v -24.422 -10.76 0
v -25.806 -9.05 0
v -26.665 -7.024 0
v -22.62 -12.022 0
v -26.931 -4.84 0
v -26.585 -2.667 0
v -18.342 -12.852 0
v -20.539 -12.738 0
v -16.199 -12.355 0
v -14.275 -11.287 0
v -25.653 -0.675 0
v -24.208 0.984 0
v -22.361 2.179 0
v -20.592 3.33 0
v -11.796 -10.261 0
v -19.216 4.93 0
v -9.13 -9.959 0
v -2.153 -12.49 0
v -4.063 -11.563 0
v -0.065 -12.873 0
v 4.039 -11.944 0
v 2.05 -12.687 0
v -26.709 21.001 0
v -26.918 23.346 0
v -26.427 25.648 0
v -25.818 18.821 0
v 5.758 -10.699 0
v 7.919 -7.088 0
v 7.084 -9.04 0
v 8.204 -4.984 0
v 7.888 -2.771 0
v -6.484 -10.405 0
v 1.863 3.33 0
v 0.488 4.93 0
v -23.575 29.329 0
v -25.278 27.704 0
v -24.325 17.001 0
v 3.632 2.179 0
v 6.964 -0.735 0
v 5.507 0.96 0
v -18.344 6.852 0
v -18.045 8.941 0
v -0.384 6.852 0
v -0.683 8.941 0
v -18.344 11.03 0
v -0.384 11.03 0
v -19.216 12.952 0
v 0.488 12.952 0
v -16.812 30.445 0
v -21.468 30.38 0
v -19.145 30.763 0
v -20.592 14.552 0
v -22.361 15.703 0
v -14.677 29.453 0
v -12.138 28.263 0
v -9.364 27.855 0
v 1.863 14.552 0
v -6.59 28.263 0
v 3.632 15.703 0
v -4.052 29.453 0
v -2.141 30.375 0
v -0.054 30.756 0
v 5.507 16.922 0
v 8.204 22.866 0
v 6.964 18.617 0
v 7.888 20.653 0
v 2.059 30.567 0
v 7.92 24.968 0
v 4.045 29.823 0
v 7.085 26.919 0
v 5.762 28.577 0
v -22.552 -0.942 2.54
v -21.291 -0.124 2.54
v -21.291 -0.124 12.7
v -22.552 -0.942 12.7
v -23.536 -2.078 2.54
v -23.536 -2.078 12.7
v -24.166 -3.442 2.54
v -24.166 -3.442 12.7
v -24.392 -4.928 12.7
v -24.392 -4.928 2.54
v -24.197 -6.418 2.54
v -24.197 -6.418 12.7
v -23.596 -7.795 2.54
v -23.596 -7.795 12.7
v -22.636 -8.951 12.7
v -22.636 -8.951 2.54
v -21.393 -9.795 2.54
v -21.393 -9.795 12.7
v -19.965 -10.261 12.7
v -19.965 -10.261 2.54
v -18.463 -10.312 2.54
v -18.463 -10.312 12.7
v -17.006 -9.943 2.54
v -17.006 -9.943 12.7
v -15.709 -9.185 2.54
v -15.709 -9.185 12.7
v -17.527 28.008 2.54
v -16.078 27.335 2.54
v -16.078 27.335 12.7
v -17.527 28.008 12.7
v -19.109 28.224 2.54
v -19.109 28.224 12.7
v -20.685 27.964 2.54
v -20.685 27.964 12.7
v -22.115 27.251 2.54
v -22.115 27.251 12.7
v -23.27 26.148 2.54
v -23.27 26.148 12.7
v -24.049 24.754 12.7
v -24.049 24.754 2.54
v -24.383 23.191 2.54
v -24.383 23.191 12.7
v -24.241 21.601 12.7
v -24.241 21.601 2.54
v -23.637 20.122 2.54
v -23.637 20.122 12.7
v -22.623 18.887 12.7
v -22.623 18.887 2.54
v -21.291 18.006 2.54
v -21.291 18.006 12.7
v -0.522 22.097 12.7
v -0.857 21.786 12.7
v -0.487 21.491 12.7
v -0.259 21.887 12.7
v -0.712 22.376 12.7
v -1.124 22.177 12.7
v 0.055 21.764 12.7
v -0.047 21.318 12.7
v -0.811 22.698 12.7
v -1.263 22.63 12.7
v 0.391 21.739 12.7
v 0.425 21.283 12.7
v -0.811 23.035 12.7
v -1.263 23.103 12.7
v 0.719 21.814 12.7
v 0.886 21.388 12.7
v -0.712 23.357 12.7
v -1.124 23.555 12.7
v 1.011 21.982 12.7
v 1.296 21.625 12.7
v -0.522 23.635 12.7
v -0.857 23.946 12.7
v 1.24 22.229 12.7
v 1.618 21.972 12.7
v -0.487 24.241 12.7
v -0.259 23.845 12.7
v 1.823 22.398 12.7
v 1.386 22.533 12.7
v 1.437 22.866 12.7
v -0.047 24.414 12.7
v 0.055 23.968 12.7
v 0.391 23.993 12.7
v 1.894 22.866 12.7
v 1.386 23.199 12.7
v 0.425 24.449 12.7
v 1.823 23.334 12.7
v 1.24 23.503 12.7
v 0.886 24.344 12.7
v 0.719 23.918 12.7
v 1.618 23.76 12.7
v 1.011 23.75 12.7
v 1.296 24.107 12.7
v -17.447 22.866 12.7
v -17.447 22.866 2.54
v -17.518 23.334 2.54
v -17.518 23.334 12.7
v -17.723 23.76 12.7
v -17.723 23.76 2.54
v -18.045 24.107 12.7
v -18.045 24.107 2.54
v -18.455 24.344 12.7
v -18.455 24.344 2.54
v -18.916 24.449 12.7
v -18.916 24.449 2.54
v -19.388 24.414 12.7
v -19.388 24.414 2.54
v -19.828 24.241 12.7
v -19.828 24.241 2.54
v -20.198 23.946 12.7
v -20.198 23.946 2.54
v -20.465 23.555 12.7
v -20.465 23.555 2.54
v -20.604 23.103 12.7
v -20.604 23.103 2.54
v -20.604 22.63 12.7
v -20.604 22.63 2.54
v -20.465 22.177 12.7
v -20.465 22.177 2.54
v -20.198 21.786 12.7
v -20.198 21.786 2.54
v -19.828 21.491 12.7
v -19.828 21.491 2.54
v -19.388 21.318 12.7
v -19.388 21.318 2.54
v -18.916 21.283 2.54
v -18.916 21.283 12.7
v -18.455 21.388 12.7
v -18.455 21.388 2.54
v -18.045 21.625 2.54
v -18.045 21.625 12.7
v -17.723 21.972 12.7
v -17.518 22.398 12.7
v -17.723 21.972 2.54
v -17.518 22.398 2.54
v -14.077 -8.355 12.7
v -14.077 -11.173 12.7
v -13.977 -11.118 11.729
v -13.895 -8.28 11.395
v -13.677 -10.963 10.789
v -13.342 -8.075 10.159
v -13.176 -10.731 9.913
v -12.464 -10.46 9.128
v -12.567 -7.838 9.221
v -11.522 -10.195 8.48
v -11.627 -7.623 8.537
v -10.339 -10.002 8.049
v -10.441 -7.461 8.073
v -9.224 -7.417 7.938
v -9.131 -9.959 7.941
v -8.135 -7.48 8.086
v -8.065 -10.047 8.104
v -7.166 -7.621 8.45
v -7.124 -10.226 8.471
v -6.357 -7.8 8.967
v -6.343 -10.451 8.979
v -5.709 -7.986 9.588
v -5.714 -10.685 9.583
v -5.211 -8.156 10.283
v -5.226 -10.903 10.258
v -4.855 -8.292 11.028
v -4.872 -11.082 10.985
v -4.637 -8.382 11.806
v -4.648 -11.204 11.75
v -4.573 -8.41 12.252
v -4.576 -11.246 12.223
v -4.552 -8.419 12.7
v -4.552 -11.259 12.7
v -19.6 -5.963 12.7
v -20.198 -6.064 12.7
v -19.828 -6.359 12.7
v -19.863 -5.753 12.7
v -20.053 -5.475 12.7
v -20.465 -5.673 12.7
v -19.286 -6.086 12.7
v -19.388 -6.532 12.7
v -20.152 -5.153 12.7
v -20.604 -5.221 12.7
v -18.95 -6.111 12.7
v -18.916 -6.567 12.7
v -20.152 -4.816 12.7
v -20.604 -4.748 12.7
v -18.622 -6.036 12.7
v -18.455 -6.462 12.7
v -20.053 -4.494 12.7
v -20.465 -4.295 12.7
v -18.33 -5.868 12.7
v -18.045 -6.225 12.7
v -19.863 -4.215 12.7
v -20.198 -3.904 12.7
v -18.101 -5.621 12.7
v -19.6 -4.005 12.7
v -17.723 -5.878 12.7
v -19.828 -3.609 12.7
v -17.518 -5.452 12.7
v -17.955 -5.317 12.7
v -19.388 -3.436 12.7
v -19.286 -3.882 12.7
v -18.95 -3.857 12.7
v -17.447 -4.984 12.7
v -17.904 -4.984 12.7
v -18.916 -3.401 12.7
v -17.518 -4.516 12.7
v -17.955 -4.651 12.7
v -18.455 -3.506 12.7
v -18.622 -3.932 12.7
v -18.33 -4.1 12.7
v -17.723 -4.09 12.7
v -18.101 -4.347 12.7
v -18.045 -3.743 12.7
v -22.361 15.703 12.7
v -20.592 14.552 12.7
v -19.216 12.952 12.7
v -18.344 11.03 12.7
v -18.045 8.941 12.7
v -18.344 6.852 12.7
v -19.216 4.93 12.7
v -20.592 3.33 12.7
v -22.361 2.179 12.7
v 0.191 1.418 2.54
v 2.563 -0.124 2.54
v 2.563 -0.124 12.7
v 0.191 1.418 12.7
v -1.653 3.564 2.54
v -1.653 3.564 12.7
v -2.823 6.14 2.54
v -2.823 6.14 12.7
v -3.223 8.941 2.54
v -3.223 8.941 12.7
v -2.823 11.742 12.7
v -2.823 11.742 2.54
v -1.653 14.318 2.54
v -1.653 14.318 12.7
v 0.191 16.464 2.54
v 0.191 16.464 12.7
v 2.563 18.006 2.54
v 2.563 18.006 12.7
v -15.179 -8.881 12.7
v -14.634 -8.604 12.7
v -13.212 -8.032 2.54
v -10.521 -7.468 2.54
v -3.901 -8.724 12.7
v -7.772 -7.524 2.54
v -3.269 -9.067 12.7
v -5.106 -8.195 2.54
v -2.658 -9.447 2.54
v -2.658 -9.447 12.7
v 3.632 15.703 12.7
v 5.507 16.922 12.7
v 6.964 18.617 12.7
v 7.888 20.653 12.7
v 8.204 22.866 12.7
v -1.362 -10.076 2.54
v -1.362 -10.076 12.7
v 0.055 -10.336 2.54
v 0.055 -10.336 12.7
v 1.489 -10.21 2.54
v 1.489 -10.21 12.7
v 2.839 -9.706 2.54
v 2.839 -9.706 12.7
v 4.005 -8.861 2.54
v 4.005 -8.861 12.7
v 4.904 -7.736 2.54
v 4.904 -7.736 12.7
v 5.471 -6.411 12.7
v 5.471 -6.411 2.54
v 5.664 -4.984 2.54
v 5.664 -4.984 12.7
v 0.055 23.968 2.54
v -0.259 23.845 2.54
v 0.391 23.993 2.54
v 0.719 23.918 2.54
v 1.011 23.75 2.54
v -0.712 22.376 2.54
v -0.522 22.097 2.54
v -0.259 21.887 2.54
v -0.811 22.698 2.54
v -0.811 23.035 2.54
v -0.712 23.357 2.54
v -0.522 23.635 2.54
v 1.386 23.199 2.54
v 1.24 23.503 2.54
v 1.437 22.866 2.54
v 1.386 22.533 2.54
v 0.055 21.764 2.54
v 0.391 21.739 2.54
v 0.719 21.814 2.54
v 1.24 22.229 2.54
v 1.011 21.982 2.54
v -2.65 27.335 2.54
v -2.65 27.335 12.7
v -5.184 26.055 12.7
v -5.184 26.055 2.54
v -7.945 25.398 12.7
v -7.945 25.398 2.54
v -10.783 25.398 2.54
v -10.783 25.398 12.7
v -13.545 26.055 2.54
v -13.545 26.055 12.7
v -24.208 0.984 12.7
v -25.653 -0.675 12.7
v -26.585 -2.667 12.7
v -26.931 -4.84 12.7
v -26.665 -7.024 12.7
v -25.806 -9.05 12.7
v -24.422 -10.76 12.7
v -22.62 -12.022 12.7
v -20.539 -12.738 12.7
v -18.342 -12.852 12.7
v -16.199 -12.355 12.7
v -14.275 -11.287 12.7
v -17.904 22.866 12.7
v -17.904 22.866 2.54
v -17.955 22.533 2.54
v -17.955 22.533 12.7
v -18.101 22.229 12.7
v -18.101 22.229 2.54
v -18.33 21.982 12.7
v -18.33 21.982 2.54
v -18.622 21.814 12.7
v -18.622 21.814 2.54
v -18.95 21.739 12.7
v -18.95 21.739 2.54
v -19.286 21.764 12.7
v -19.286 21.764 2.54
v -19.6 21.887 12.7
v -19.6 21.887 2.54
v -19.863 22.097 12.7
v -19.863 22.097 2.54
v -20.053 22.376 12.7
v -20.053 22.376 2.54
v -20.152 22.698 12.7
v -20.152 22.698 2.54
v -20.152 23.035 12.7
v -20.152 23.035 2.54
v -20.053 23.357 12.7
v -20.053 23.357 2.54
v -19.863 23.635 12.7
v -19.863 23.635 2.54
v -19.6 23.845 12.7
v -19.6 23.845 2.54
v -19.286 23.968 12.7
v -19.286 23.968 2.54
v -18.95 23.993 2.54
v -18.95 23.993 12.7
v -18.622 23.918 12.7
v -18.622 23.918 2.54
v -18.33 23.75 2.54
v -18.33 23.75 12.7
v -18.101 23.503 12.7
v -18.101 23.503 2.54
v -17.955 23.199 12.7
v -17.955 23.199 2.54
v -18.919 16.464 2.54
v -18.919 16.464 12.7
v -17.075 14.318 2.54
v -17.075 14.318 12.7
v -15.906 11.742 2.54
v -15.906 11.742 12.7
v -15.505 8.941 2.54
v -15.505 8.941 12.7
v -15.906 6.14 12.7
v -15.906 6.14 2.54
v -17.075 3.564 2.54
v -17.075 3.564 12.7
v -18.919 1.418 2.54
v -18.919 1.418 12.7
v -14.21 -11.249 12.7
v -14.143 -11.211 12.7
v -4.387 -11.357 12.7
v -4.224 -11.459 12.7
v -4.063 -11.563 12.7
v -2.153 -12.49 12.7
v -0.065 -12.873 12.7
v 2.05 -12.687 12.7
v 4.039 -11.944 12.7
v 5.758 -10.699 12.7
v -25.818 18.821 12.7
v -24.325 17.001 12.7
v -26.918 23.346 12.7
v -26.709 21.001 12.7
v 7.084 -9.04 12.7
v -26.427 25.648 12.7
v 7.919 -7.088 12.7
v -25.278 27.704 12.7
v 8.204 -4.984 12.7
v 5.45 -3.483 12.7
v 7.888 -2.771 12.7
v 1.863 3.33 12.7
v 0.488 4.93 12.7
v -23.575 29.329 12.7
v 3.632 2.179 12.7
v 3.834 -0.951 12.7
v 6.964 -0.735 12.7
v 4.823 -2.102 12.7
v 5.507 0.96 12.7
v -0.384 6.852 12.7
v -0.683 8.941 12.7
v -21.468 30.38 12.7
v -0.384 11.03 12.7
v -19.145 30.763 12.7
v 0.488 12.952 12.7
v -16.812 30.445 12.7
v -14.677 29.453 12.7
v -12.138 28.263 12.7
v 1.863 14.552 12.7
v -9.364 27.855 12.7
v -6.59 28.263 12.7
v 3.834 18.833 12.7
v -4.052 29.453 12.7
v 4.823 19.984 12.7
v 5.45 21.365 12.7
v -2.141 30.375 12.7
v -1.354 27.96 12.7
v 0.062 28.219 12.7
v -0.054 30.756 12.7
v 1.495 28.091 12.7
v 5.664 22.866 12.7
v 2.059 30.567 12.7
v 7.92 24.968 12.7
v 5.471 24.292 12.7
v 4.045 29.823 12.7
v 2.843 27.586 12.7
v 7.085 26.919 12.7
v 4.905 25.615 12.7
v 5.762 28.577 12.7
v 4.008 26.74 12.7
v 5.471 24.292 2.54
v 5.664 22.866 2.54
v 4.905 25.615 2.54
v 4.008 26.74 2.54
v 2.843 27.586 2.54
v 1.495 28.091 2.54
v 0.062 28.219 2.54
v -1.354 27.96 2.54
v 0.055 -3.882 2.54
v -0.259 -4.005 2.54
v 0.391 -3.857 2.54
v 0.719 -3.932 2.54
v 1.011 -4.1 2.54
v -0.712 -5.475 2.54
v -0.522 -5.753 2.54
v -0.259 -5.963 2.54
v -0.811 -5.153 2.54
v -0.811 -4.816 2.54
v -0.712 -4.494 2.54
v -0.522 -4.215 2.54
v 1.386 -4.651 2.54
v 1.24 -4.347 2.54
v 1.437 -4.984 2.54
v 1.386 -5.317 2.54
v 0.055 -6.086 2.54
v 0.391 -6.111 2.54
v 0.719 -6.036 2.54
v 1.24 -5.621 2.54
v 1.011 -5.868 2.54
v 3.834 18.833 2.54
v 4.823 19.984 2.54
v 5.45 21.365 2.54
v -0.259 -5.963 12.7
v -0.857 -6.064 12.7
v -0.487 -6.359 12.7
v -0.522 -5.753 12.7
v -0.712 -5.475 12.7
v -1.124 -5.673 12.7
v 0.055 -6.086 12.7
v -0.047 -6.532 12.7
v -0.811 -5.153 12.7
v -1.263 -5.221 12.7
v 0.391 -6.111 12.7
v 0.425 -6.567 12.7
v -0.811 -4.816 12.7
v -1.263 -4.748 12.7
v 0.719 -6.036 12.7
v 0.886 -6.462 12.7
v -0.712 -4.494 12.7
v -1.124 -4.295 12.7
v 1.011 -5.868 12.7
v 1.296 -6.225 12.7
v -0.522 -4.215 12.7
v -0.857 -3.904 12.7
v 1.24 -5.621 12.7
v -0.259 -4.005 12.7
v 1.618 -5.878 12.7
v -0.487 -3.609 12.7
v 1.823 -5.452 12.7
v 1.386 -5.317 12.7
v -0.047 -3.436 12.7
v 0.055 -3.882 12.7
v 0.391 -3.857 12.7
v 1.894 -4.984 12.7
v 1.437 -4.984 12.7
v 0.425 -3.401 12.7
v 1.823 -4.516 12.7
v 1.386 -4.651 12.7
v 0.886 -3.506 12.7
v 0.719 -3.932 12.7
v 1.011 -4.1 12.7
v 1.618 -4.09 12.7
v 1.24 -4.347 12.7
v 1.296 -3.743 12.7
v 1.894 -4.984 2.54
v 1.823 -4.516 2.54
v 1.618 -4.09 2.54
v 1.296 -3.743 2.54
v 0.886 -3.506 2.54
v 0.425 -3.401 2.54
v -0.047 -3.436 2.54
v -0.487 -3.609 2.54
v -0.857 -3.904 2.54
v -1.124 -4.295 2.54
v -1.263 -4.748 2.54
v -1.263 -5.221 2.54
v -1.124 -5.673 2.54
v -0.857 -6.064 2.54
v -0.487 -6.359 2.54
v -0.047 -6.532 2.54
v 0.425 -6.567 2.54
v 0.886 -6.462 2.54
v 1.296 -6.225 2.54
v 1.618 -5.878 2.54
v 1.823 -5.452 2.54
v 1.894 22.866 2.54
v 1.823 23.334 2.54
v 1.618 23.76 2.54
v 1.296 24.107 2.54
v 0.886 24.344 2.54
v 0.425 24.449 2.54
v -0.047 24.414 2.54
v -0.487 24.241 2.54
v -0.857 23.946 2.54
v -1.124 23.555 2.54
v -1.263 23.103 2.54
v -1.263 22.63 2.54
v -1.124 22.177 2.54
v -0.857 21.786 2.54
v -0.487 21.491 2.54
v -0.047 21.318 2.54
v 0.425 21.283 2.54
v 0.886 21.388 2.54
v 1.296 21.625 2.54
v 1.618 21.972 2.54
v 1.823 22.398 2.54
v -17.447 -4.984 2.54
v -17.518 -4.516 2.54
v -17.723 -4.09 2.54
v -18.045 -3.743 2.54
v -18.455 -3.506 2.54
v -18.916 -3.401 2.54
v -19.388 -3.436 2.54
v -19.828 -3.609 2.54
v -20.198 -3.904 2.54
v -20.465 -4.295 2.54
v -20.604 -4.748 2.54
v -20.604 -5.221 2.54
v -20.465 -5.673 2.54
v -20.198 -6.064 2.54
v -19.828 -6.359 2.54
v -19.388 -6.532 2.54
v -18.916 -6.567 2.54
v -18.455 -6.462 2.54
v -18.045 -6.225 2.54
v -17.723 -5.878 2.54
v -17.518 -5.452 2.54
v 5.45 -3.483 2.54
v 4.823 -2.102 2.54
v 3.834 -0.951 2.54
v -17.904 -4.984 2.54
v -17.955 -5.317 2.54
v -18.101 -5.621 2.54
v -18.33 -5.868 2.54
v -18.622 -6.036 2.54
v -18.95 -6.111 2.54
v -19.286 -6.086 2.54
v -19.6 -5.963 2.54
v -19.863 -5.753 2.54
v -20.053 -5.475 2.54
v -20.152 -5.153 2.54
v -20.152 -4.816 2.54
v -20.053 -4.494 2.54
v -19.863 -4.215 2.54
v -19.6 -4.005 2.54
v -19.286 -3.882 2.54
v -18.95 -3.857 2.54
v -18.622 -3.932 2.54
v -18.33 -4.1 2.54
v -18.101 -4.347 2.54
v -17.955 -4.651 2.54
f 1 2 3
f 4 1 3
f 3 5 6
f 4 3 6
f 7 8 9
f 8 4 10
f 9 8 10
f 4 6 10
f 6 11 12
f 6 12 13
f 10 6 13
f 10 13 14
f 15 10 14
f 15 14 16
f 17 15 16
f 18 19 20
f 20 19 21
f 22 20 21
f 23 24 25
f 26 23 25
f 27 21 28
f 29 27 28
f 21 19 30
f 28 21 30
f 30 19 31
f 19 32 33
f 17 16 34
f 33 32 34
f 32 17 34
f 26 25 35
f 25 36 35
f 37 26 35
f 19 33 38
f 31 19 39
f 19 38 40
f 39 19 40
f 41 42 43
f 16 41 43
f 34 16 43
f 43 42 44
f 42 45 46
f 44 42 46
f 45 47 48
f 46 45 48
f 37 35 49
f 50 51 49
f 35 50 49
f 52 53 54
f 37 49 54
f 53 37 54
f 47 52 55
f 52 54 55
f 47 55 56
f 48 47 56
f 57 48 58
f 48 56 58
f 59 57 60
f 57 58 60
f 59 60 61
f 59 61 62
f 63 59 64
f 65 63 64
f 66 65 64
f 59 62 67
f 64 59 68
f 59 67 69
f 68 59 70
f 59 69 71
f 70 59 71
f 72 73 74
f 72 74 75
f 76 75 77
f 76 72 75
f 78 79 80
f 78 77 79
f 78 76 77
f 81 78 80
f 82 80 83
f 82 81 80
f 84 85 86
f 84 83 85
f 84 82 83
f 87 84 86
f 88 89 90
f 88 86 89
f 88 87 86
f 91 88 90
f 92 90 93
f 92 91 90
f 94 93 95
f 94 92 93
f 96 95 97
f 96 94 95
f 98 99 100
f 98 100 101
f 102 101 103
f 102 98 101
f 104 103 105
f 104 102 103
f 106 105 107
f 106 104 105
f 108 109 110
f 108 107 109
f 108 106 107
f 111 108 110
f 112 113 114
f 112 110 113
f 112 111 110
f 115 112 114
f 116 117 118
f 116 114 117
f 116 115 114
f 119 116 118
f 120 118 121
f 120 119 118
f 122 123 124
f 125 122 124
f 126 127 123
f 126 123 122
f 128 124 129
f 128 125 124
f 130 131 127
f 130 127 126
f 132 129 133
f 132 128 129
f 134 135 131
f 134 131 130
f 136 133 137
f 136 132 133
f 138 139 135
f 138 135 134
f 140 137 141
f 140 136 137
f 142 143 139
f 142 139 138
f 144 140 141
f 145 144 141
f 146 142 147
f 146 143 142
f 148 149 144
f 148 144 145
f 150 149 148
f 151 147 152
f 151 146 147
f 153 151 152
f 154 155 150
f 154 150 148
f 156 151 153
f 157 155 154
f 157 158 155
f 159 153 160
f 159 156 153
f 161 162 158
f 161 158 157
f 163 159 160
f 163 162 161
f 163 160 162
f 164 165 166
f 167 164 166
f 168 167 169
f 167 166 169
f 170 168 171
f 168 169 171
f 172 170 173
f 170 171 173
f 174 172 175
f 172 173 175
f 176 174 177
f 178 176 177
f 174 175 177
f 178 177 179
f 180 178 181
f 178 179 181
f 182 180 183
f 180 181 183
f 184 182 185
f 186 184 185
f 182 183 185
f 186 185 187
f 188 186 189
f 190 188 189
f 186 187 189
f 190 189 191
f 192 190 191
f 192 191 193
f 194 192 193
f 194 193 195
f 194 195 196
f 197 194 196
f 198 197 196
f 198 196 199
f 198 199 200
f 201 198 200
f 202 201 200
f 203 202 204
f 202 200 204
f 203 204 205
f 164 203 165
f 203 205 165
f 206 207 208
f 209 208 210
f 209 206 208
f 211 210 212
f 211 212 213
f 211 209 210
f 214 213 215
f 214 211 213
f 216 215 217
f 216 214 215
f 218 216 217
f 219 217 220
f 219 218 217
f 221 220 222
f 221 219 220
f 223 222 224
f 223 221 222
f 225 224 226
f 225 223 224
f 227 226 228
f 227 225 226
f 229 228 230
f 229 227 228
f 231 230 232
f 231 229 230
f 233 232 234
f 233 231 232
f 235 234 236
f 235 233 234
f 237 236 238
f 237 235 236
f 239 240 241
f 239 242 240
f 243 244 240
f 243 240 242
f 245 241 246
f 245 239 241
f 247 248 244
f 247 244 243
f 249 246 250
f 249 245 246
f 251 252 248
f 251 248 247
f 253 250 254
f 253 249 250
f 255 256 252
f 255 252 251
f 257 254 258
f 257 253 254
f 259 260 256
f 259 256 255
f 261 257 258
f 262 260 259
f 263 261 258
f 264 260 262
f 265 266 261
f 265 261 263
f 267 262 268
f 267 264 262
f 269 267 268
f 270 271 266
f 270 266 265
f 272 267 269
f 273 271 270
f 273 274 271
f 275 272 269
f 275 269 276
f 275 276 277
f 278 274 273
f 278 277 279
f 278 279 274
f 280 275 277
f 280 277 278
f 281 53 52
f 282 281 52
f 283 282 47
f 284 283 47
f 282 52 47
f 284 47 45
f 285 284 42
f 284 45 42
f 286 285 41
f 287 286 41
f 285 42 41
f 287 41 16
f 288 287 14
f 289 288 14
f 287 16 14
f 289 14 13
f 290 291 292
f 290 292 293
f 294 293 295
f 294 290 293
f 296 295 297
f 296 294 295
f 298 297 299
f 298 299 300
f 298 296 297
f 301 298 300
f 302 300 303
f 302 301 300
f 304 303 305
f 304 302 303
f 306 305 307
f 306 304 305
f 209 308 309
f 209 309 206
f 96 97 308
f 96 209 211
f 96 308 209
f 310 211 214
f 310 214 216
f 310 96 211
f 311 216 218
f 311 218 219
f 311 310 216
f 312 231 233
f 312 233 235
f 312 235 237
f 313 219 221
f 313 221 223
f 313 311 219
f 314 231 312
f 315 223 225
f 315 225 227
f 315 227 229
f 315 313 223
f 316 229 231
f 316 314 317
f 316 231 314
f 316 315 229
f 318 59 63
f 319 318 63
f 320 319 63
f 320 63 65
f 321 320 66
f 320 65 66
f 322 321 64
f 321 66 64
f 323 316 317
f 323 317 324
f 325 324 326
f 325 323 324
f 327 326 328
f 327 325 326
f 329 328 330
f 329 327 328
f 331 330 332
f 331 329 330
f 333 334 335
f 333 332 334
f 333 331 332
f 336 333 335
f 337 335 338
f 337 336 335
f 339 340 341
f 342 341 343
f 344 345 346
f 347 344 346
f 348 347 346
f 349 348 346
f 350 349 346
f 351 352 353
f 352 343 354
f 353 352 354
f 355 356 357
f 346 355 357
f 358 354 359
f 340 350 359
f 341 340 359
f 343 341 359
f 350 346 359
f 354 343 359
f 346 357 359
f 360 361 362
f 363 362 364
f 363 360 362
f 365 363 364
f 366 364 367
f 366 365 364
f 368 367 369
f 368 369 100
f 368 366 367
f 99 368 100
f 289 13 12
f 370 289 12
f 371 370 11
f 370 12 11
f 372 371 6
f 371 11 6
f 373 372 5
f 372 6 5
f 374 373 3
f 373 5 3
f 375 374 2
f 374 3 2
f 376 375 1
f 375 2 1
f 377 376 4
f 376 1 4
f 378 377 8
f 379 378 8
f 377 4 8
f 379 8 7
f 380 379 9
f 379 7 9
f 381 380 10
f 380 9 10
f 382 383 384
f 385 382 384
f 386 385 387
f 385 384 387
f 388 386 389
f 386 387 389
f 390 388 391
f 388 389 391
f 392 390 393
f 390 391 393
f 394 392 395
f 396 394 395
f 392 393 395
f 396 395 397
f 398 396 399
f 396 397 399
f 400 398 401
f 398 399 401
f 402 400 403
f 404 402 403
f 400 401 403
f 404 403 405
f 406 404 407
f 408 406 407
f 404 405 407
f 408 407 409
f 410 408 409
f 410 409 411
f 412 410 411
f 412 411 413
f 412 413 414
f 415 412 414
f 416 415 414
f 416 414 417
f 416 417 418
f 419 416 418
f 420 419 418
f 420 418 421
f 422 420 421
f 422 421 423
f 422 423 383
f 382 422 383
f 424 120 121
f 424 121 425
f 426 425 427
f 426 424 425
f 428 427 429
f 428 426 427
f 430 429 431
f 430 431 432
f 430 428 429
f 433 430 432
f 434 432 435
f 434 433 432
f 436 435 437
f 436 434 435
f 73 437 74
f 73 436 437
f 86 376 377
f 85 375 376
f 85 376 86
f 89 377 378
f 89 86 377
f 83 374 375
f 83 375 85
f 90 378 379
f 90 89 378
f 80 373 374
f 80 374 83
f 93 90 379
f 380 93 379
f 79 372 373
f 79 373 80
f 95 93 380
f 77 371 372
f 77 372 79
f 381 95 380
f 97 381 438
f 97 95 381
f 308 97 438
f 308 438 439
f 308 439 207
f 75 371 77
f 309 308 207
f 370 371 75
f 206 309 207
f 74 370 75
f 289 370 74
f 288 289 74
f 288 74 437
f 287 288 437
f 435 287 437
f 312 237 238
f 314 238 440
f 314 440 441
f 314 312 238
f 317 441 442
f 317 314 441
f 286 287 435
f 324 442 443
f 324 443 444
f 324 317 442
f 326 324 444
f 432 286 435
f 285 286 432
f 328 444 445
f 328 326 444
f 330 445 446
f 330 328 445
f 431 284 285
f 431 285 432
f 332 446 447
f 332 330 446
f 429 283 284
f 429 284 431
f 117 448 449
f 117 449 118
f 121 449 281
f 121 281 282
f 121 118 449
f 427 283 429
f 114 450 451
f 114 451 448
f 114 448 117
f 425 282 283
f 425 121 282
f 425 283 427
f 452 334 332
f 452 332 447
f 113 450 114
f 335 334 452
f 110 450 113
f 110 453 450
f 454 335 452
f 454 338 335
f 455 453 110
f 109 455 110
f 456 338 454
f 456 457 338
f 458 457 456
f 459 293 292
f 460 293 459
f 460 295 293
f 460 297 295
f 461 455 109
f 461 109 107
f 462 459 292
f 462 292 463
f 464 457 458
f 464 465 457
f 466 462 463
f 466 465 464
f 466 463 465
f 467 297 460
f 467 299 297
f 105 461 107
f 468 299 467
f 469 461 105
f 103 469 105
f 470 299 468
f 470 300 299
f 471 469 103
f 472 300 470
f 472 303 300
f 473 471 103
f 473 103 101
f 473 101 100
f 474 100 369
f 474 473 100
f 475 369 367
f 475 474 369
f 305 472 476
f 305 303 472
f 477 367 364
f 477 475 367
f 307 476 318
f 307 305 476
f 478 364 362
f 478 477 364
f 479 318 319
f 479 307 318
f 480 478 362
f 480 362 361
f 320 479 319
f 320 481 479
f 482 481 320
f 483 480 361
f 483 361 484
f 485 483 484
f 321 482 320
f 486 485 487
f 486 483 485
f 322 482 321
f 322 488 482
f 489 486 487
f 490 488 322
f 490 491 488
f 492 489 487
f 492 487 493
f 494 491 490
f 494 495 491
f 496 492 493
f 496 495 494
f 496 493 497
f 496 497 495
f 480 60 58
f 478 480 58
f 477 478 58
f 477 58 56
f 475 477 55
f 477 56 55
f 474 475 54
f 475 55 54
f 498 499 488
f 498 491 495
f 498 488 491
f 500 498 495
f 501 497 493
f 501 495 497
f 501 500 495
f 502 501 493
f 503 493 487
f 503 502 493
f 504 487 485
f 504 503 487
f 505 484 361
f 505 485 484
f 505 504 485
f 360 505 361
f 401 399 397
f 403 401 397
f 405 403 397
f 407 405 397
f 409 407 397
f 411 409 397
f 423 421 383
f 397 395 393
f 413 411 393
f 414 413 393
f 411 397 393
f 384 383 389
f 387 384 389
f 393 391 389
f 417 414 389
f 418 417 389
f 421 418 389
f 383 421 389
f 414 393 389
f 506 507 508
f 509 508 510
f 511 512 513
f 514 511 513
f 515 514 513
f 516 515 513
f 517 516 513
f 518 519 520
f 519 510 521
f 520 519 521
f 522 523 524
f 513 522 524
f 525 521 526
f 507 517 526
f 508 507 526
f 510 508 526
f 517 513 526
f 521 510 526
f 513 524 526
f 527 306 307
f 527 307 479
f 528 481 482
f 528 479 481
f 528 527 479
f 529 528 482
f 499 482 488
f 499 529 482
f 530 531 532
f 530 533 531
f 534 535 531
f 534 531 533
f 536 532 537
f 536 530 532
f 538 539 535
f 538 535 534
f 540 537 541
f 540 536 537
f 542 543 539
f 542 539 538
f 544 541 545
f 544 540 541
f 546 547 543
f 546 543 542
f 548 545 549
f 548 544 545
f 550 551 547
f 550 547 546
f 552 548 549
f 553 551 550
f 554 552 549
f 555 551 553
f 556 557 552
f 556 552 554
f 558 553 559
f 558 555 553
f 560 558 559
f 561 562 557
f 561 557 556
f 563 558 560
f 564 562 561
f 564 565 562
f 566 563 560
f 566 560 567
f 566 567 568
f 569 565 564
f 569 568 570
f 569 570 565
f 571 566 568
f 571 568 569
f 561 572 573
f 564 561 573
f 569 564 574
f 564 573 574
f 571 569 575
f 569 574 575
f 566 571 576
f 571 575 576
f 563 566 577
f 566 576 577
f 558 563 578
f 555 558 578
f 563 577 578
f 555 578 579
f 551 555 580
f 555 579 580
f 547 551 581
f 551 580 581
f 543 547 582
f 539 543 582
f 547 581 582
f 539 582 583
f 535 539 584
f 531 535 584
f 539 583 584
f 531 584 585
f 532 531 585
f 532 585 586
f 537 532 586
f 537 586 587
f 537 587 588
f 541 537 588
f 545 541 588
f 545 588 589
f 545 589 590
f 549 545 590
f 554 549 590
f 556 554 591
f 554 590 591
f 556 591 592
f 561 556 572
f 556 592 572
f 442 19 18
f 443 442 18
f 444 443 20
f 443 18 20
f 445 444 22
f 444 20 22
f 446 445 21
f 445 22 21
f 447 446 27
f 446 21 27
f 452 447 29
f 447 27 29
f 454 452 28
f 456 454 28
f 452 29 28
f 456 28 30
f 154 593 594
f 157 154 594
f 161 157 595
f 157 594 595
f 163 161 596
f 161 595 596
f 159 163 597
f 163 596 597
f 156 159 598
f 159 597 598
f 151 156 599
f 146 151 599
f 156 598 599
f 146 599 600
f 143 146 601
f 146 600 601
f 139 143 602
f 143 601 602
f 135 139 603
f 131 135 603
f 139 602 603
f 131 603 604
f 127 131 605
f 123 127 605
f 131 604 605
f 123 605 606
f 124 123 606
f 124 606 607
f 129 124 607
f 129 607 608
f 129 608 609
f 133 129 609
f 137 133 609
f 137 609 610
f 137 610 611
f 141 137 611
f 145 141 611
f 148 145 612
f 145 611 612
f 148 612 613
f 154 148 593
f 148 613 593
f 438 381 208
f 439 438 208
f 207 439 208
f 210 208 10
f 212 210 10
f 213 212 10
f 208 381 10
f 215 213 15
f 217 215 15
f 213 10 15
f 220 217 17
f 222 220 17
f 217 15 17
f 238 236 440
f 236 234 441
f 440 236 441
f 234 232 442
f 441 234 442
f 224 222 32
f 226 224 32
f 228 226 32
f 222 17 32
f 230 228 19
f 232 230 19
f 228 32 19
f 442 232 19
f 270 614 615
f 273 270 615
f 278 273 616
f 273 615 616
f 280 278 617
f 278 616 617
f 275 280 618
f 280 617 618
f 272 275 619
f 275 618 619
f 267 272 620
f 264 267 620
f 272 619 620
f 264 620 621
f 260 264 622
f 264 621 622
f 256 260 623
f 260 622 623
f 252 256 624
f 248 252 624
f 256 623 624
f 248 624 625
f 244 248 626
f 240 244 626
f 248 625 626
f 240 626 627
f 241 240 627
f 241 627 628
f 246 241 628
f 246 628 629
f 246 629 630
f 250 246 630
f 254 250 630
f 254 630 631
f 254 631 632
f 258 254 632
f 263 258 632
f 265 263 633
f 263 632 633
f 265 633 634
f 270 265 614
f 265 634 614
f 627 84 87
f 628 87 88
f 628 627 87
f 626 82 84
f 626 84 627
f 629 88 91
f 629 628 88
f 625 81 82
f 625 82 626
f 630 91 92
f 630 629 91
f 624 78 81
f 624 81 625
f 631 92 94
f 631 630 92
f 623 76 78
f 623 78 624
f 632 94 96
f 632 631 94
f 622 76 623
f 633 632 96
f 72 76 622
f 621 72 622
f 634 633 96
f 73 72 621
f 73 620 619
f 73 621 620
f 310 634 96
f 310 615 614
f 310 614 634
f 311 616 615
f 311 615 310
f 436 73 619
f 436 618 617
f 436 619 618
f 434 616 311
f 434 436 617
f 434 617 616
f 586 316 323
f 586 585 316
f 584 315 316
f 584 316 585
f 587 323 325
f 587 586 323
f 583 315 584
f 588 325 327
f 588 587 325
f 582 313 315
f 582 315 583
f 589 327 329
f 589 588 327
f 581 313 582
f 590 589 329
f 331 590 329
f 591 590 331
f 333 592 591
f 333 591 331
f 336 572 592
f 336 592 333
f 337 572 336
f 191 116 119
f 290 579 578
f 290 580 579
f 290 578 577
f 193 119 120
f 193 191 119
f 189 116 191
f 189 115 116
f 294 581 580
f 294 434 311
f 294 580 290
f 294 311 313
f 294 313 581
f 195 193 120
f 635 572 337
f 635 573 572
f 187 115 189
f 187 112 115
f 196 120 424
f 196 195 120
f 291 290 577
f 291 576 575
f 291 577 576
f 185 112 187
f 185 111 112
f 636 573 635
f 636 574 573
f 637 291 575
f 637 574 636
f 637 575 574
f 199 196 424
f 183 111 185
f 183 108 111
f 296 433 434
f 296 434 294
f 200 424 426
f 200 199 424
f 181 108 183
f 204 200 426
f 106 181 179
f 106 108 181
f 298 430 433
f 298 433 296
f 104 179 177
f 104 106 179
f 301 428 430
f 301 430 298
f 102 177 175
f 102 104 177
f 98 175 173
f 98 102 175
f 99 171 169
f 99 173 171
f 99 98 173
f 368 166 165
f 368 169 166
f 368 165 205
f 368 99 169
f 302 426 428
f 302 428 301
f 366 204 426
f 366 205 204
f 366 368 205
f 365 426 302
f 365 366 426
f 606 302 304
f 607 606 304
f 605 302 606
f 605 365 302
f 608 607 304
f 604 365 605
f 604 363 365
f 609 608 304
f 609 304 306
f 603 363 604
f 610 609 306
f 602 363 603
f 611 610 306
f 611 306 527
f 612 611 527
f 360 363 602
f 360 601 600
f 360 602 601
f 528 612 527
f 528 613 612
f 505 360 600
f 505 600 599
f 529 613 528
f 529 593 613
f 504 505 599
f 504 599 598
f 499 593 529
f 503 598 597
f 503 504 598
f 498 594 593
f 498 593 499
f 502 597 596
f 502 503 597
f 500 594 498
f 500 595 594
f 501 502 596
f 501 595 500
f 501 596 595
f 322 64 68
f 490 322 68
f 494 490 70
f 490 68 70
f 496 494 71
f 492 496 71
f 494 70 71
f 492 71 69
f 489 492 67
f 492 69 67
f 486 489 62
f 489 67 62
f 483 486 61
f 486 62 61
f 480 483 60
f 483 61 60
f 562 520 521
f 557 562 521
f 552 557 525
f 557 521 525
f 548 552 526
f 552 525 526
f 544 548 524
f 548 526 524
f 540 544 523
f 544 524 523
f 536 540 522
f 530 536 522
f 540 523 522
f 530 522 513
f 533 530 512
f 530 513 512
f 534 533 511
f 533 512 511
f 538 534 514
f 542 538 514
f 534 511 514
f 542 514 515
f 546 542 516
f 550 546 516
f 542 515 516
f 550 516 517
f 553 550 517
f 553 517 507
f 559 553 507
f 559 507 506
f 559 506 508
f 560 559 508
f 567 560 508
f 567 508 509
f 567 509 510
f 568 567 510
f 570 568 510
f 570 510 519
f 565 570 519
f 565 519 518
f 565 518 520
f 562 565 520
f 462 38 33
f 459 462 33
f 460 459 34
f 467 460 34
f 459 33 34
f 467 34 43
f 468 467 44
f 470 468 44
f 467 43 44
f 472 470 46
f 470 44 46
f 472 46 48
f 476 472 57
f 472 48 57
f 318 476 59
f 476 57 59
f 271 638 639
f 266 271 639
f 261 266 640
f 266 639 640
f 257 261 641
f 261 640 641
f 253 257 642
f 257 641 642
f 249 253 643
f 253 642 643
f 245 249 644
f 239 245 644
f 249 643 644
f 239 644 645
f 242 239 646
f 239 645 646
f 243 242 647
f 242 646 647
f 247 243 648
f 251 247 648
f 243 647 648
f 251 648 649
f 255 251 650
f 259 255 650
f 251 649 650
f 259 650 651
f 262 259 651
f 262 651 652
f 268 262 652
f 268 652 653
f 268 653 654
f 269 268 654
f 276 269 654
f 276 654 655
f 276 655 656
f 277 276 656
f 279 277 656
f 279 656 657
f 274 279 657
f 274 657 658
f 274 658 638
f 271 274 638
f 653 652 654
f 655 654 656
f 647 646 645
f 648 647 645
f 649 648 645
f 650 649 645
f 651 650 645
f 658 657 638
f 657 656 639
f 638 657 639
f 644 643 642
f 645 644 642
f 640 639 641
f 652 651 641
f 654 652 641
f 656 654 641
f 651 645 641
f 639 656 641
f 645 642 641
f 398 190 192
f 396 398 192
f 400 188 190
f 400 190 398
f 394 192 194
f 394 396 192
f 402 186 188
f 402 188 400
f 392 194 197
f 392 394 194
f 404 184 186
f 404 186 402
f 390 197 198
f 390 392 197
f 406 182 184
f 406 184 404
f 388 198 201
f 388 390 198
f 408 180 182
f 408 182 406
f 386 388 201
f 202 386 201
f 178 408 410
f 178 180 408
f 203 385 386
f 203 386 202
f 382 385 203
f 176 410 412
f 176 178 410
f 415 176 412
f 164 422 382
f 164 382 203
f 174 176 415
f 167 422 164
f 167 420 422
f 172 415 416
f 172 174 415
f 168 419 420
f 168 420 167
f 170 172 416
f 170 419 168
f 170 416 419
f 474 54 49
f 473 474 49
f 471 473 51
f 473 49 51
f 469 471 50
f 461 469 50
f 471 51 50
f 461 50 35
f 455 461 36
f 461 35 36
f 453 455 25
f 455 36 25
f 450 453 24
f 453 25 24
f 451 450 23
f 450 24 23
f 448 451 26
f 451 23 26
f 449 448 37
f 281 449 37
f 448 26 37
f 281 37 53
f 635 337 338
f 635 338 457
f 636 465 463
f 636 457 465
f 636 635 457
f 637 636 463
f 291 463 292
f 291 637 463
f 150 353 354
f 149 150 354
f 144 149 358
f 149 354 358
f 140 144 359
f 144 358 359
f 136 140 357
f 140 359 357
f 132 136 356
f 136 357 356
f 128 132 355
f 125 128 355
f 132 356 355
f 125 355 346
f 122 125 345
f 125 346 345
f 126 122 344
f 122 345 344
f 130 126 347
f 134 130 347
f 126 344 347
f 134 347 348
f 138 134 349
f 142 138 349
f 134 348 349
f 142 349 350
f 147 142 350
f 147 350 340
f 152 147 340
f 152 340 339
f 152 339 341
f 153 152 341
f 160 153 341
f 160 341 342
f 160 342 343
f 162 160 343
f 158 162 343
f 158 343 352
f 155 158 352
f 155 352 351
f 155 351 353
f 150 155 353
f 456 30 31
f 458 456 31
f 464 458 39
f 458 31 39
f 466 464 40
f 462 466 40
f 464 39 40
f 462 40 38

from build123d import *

# Parameters (mm, degrees)
F1_DEPTH = 12.7
F2_T     = -2.54
F3_R     = 1.5875
F4_DEPTH = 10.16
F5_D     = 2.2606
F5_DEPTH = 10.161
F6_D     = 2.2606
F6_DEPTH = 10.161
F7_R     = 4.7625
F8_DEPTH = 25.4


with BuildPart() as f1:
    # F0 (on Top) → F1 (new body)
    with BuildSketch(Plane.XY):
        with BuildLine():
            ThreePointArc((-14.6767156663, 29.4530092287), (-12.0777332251, 26.6050755519), (-11.136649862, 22.8661187375))
            ThreePointArc((-11.136649862, 22.8661187375), (-14.7855906965, 16.2084748129), (-22.3607508211, 15.7025687681))
            ThreePointArc((-22.3607508211, 15.7025687681), (-18.0453134926, 8.9409904355), (-22.3607508211, 2.1794121029))
            ThreePointArc((-22.3607508211, 2.1794121029), (-14.7855906965, 1.673506058), (-11.136649862, -4.9841378665))
            ThreePointArc((-11.136649862, -4.9841378665), (-11.9647424889, -8.5047751532), (-14.2753729744, -11.287150229))
            ThreePointArc((-14.2753729744, -11.287150229), (-9.1296413708, -9.9591111779), (-4.06321014, -11.5633293799))
            ThreePointArc((-4.06321014, -11.5633293799), (-6.584769511, -1.1252359292), (3.6324394001, 2.1794121029))
            ThreePointArc((3.6324394001, 2.1794121029), (-0.6829979284, 8.9409904355), (3.6324394001, 15.7025687681))
            ThreePointArc((3.6324394001, 15.7025687681), (-6.588170937, 19.0132972903), (-4.0515957548, 29.4530092287))
            ThreePointArc((-4.0515957548, 29.4530092287), (-9.3641557105, 27.8546574286), (-14.6767156663, 29.4530092287))
        make_face()
        with BuildLine():
            ThreePointArc((-22.3607508211, 15.7025687681), (-14.7855906965, 16.2084748129), (-11.136649862, 22.8661187375))
            ThreePointArc((-11.136649862, 22.8661187375), (-12.0777332251, 26.6050755519), (-14.6767156663, 29.4530092287))
            ThreePointArc((-14.6767156663, 29.4530092287), (-25.9292475994, 26.7189401846), (-22.3607508211, 15.7025687681))
        make_face()
        with BuildLine():
            ThreePointArc((8.2044268003, 22.8661187375), (4.0453394351, 29.823079554), (-4.0515957548, 29.4530092287))
            ThreePointArc((-4.0515957548, 29.4530092287), (-6.588170937, 19.0132972903), (3.6324394001, 15.7025687681))
            ThreePointArc((3.6324394001, 15.7025687681), (6.9640265452, 18.6170153923), (8.2044268003, 22.8661187375))
        make_face()
        with BuildLine():
            ThreePointArc((-11.136649862, -4.9841378665), (-14.7855906965, 1.673506058), (-22.3607508211, 2.1794121029))
            ThreePointArc((-22.3607508211, 2.1794121029), (-25.8060038773, -9.0496593551), (-14.2753729744, -11.287150229))
            ThreePointArc((-14.2753729744, -11.287150229), (-11.9647424889, -8.5047751532), (-11.136649862, -4.9841378665))
        make_face()
        with BuildLine():
            ThreePointArc((8.2044268003, -4.9841378665), (6.9640265452, -0.7350345214), (3.6324394001, 2.1794121029))
            ThreePointArc((3.6324394001, 2.1794121029), (-6.584769511, -1.1252359292), (-4.06321014, -11.5633293799))
            ThreePointArc((-4.06321014, -11.5633293799), (4.0392009389, -11.9443942747), (8.2044268003, -4.9841378665))
        make_face()
    extrude(amount=F1_DEPTH)

    # F2
    f2_openings = [f1.faces().sort_by_distance(p)[0] for p in [
        (-9.363943, 8.943821, 12.7),
    ]]
    offset(amount=F2_T, openings=f2_openings, kind=Kind.INTERSECTION)

    # F3 (on face) → F4 (join, through all)
    with BuildSketch(Plane.XY.offset(2.54)):
        with Locations((-19.0346940417, 22.8661187375)):
            Circle(F3_R)
        with Locations((0.3063826207, 22.8661187375)):
            Circle(F3_R)
        with Locations((-19.0346940417, -4.9841378665)):
            Circle(F3_R)
        with Locations((0.3063826207, -4.9841378665)):
            Circle(F3_R)
    extrude(amount=F4_DEPTH)

    # F5 (through all, one way)
    with BuildSketch(Plane(origin=(0, 0, 2.54), x_dir=(1, 0, 0), z_dir=(0, 0, -1))):
        with Locations((-19.0346940417, -22.8661187375)):
            Circle(F5_D / 2)
    extrude(amount=-F5_DEPTH, mode=Mode.SUBTRACT)

    # F6 (through all, one way)
    with BuildSketch(Plane(origin=(0, 0, 2.54), x_dir=(1, 0, 0), z_dir=(0, 0, -1))):
        with Locations((0.3063826207, -22.8661187375), (0.3063826207, 4.9841378665), (-19.0346940417, 4.9841378665)):
            Circle(F6_D / 2)
    extrude(amount=-F6_DEPTH, mode=Mode.SUBTRACT)

    # F7 (on Front) → F8 (cut)
    with BuildSketch(Plane.XZ):
        with Locations((-9.3144346029, 12.7)):
            Circle(F7_R)
    extrude(amount=F8_DEPTH, mode=Mode.SUBTRACT)


solid = f1.part
